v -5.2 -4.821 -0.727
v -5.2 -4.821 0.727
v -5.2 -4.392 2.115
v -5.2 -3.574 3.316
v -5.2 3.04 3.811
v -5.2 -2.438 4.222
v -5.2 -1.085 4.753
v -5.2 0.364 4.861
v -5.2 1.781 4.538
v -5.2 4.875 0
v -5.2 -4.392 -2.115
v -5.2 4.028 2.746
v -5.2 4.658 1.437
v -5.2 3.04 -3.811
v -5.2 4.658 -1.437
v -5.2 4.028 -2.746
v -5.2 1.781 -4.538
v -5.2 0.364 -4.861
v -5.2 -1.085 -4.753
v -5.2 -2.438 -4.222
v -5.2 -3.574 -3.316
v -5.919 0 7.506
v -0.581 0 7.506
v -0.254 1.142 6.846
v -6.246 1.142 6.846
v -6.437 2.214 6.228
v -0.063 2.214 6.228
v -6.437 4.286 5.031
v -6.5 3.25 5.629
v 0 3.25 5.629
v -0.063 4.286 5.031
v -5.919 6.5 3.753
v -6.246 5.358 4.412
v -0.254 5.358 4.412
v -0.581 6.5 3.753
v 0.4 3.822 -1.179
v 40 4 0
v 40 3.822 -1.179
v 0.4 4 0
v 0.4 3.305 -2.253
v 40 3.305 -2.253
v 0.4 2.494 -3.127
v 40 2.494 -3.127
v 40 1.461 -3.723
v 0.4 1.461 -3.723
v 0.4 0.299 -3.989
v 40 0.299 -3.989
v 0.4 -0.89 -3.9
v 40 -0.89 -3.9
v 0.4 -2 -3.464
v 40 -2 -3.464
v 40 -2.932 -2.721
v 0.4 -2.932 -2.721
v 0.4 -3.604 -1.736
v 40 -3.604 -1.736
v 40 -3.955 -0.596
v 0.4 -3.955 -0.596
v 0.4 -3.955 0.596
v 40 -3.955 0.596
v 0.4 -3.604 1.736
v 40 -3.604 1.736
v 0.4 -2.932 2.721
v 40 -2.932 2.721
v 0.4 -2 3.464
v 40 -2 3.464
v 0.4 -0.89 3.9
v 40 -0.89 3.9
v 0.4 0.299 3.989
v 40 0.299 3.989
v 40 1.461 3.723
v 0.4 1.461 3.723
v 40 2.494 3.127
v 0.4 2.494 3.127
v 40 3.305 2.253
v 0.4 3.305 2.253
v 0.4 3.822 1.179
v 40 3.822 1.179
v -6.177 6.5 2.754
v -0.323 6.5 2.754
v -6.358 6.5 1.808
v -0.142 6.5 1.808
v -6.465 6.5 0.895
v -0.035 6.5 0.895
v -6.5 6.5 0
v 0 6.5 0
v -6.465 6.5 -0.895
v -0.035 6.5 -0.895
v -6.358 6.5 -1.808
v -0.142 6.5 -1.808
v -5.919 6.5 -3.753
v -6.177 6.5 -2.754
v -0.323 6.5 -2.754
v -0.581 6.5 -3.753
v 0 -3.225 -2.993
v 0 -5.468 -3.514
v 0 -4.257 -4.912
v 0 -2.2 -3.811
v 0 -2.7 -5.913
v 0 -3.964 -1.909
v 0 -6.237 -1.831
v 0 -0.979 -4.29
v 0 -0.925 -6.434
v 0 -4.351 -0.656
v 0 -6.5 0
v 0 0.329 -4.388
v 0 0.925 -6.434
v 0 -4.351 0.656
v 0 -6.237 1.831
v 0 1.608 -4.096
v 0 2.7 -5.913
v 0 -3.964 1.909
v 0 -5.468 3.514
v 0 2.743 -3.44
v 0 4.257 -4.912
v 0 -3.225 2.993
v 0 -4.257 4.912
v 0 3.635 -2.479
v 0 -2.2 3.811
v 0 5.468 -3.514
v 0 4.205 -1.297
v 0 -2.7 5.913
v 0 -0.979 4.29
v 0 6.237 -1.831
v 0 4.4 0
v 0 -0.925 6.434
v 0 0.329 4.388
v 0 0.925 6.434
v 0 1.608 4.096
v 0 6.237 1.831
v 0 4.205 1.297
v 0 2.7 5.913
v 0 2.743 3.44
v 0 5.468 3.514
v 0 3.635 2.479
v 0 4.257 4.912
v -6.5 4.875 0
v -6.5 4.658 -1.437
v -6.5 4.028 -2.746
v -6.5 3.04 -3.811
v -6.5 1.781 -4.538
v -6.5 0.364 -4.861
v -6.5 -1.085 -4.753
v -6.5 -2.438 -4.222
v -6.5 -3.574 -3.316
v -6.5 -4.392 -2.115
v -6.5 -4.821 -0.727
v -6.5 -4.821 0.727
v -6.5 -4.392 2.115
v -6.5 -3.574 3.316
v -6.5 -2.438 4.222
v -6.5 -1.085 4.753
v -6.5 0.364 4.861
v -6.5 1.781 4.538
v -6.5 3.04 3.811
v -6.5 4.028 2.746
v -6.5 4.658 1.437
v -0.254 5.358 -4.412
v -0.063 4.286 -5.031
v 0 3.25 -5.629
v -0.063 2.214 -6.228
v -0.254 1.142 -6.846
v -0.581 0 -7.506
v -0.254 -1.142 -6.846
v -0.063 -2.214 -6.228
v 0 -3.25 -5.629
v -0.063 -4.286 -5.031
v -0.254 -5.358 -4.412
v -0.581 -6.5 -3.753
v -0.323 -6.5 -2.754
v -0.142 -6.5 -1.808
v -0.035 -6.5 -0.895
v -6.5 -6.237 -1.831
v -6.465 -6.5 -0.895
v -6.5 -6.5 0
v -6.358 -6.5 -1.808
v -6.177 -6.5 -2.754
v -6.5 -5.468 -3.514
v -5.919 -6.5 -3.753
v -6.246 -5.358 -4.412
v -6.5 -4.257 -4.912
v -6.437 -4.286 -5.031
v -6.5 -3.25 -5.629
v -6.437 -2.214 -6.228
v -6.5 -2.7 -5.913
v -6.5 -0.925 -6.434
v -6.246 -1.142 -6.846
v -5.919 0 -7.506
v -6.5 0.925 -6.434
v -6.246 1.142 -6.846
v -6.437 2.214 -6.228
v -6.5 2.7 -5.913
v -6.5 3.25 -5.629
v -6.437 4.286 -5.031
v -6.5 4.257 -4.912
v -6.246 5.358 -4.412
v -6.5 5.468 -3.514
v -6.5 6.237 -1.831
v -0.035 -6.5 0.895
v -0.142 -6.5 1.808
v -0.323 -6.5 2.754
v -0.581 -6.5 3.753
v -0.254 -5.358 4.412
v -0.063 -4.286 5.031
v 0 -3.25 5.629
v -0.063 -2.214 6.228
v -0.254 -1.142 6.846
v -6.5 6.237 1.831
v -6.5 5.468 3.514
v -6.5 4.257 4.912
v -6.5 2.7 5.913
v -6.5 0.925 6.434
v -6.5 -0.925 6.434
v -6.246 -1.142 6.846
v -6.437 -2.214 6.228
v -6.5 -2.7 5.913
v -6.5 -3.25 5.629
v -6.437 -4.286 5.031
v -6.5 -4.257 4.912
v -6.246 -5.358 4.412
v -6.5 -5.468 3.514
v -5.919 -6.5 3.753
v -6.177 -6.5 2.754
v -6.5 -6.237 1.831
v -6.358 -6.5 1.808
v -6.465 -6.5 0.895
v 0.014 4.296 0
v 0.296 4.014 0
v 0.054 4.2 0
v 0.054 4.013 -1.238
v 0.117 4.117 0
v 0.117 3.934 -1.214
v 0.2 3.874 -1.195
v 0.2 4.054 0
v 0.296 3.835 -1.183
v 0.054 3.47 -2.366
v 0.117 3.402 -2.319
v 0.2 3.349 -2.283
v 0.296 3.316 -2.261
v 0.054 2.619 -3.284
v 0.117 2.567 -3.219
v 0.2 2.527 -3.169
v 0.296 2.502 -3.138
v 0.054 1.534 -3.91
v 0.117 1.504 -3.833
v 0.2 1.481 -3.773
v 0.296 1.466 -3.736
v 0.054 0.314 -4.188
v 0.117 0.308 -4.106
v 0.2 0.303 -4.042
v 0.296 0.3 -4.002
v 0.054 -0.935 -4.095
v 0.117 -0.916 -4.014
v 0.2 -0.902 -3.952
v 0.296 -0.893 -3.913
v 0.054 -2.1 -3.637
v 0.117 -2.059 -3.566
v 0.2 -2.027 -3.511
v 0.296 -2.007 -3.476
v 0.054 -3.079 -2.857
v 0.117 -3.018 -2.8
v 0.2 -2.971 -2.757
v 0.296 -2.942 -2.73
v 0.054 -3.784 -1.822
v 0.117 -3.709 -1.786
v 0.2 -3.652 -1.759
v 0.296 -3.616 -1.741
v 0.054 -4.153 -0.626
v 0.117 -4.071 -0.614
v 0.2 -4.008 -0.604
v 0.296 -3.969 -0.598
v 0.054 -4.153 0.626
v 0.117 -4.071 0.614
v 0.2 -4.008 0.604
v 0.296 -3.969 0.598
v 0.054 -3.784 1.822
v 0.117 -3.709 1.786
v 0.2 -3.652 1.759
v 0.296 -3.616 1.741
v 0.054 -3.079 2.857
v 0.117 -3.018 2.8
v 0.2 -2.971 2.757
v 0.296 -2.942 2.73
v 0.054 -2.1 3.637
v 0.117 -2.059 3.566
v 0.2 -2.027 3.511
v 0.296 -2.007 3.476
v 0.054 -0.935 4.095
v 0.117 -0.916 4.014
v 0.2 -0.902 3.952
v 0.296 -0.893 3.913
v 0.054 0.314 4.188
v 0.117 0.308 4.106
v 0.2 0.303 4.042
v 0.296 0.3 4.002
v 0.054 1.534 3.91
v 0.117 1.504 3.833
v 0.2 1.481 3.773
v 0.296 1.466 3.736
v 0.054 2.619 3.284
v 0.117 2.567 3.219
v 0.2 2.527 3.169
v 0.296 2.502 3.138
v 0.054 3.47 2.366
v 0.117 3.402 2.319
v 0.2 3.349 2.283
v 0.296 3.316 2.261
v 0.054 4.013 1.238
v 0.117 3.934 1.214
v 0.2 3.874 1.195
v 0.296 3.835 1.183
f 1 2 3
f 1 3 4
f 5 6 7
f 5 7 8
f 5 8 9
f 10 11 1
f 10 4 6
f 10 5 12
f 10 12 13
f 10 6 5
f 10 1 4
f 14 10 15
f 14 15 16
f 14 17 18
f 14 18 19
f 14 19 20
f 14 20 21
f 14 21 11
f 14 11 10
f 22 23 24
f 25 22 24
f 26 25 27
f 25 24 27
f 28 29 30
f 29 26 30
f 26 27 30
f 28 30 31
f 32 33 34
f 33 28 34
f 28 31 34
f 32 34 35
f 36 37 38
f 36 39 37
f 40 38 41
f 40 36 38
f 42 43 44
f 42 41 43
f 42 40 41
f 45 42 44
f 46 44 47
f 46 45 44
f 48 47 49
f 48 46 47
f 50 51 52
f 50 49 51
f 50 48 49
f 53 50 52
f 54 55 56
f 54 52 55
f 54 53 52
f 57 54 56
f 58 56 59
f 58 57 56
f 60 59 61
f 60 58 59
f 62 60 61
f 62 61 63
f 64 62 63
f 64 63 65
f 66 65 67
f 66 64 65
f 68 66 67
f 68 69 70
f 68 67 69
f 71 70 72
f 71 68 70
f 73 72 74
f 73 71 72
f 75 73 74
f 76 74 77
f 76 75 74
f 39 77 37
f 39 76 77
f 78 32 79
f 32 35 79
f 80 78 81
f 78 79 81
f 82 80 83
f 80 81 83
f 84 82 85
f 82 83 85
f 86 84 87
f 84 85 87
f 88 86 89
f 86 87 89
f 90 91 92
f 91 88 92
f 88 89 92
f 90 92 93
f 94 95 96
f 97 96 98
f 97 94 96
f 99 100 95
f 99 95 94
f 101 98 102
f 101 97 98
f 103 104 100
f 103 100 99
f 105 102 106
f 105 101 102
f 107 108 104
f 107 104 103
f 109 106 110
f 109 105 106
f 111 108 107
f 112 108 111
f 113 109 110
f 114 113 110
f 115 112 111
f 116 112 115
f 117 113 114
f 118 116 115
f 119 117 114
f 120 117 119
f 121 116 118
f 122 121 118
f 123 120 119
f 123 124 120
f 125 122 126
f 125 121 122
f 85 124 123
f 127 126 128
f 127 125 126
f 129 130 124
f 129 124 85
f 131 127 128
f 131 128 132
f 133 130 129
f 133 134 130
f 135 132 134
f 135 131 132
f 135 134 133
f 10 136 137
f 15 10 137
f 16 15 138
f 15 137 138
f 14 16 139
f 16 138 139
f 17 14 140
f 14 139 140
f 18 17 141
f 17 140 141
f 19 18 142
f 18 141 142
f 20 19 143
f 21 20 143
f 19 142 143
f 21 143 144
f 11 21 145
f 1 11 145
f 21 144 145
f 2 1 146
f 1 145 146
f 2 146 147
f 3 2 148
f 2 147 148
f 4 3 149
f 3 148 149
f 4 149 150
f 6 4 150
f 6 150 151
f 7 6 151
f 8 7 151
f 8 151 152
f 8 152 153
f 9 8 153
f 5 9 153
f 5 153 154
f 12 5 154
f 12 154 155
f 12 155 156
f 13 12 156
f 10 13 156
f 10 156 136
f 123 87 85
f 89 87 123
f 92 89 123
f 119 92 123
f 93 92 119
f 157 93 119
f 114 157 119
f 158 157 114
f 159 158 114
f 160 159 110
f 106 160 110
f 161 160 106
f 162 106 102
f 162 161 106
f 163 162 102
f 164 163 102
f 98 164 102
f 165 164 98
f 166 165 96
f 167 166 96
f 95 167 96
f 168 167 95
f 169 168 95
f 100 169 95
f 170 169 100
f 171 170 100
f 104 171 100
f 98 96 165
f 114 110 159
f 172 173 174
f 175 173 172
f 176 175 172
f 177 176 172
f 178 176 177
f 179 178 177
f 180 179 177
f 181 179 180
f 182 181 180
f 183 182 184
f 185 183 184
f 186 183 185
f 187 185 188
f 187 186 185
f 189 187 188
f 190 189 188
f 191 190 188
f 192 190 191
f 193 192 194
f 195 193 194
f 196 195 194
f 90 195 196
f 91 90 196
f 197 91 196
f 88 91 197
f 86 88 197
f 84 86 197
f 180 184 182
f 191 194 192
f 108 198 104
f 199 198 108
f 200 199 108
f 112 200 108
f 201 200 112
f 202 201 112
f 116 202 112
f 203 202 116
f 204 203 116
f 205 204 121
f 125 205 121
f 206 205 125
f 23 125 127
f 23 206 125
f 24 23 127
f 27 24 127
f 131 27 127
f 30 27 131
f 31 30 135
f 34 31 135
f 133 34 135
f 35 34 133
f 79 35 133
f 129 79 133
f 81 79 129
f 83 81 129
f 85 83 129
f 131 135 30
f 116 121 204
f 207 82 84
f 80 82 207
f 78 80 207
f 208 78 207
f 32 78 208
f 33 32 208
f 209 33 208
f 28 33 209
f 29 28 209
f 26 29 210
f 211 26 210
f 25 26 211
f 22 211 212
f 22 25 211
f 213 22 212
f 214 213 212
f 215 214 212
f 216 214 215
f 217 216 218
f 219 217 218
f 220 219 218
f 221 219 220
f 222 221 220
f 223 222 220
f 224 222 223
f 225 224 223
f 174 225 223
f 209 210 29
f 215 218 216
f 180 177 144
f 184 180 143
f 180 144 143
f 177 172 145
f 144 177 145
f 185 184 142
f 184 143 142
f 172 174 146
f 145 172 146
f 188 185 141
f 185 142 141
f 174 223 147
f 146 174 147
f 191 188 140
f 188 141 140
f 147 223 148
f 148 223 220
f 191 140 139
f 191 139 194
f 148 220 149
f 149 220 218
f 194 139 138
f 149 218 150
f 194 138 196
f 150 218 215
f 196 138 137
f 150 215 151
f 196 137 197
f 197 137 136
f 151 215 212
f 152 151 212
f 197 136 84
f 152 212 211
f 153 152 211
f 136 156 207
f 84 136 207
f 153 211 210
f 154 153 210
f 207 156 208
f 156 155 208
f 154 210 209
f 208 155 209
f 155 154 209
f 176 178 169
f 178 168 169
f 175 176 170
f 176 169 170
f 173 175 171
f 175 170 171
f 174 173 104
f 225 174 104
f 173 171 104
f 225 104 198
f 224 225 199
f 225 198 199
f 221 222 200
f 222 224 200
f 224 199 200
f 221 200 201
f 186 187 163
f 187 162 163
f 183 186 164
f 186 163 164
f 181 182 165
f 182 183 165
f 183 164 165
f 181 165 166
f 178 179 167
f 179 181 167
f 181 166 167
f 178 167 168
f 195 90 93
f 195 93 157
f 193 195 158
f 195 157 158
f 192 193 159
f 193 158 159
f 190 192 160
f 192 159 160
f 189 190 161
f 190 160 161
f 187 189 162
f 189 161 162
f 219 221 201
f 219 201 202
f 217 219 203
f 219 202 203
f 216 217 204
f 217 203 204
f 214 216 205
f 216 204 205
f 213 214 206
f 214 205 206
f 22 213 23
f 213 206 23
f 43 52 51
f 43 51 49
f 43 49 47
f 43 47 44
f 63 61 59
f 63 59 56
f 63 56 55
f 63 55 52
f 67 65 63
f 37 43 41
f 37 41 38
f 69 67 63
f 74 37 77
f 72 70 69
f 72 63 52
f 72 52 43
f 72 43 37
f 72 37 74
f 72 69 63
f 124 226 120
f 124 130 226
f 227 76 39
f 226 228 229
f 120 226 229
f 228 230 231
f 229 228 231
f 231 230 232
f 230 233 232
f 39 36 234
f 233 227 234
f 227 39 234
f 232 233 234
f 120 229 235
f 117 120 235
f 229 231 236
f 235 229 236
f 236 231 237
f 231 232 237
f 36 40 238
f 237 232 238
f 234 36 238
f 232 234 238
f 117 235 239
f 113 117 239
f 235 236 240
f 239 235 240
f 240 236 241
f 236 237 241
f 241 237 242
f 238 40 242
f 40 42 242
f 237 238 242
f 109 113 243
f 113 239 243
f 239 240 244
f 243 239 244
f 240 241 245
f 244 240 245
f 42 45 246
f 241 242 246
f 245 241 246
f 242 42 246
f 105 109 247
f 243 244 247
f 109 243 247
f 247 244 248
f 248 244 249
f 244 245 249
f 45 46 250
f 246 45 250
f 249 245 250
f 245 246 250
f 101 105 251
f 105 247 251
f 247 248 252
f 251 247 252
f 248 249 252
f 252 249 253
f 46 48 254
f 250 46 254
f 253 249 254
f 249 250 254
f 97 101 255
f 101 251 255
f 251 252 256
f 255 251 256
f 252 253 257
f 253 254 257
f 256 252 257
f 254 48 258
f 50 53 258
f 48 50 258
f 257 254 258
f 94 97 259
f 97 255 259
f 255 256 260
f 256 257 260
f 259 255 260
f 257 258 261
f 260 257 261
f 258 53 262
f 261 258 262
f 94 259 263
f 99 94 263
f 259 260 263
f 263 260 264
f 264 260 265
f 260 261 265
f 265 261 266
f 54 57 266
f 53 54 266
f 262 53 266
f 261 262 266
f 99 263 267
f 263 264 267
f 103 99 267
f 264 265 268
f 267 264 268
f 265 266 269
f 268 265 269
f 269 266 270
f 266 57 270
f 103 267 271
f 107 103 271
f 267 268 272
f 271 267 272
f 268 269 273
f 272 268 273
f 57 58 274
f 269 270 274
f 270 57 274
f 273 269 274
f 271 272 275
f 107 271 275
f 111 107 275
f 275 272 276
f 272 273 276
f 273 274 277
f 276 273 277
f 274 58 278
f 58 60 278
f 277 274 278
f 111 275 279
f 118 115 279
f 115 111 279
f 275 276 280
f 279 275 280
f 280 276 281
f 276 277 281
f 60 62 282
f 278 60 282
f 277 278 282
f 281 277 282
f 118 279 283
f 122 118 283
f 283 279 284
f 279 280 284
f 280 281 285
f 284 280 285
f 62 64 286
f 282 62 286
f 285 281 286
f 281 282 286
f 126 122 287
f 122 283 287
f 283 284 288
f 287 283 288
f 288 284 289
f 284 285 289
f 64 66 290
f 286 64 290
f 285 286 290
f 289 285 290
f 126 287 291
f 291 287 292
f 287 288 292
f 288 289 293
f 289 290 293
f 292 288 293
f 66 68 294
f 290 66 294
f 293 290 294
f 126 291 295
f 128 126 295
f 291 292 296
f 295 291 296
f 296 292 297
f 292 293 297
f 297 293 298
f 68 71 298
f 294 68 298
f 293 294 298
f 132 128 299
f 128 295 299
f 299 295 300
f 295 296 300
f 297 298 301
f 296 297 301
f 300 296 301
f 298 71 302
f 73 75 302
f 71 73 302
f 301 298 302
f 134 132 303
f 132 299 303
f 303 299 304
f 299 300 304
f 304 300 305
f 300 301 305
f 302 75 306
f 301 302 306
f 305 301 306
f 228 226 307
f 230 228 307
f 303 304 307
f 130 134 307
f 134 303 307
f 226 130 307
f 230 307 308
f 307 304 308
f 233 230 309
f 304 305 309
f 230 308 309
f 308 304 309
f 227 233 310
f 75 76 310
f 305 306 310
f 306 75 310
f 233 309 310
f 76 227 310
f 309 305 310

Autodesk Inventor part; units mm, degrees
ref_plane "YZ Plane" through (0, 0, 0) normal (1, 0, 0) x (0, 1, 0)
ref_plane "XZ Plane" through (0, 0, 0) normal (0, 1, 0) x (-1, 0, 0)
sketch "Sketch1" plane through (0, 0, 0) normal (0, 0, 1) x (1, 0, 0)
  line L0 (0, 4) -> (0, 0)
  line L1 (0, 0) -> (40, 0)
  line L2 (40, 0) -> (40, 4)
  line L3 (40, 4) -> (0, 4)
  line L4 (-8, 0) -> (48, 0) projected
  line L5 (0, -0.8) -> (0, 4.8) projected
  dimension "d0" = 8
  dimension "d1" = 40
revolve "Body" add sketch "Sketch1" angle 360 about axis through (0, 0, 0) along (1, 0, 0)
sketch "Sketch2" plane through (0, 0, 0) normal (1, 0, 0) x (0, 1, 0)
  line L0 (0, 7.5056) -> (6.5, 3.7528)
  line L1 (6.5, 3.7528) -> (6.5, -3.7528)
  line L2 (6.5, -3.7528) -> (0, -7.5056)
  line L3 (0, -7.5056) -> (-6.5, -3.7528)
  line L4 (-6.5, -3.7528) -> (-6.5, 3.7528)
  line L5 (-6.5, 3.7528) -> (0, 7.5056)
  line L6 (-9.1, 0) -> (9.1, 0) projected
  line L7 (0, -10.5078) -> (0, 10.5078) projected
  point P0 (0, 0)
  point P1 (0, 0)
  dimension "d2" = 13
extrude "Head" add sketch "Sketch2" against normal blind 6.5
sketch "Sketch3" plane through (-6.5, 0, 0) normal (-1, 0, 0) x (0, 1, 0)
  circle A0 centre (0, 0) radius 4.875
  point P0 (0, 0)
  dimension "d12" = 9.75
extrude "Indent1" cut sketch "Sketch3" against normal blind 1.3
sketch "Sketch4" plane through (0, 0, 0) normal (0, 0, 1) x (1, 0, 0)
  line L0 (-6.5, 7.5056) -> (-6.5, 6.5)
  line L1 (-6.5, 6.5) -> (-5.9194, 7.5056)
  line L2 (-5.9194, 7.5056) -> (-6.5, 7.5056)
  line L3 (0, 7.5056) -> (0, 6.5)
  line L4 (0, 6.5) -> (-0.5806, 7.5056)
  line L5 (-0.5806, 7.5056) -> (0, 7.5056)
  line L6 (0, 0) -> (-6.5, 0) projected
  line L7 (-6.5, 0) -> (-6.5, 6.5) projected
  line L8 (0, 0) -> (0, 6.5) projected
  line L9 (-7.8, 0) -> (1.3, 0) projected
  line L10 (-5.9194, 7.5056) -> (-0.5806, 7.5056) construction
  line L11 (0, -1.5011) -> (0, 9.0067) projected
  dimension "d6" = 30
  dimension "d7" = 30
  dimension "d16" = 13
  dimension "d17" = 13
  dimension "d18" = 15.0111
revolve "Chamfer1" cut sketch "Sketch4" angle 360 about axis through (-10, 0, 0) along (1, 0, 0)
fillet "Fillet1" radius 0.4 1 edges at (0, -4, 0)
thread "Thread" size "M8x1.25" class "6g" standard "ISO Metric profile" length 37.5
ref_plane "Work Plane1" through (3, 0, 0) normal (0, 0.5, 0.866) x (1, 0, 0)
equation "\"d0\" = GD"
equation "\"d1\" = NLG"
equation "\"d2\" = SW"
equation "\"d3\" = KOH"
equation "\"d12\" = 0.75 * SW0"
equation "\"d14\" = 0.2 * KOH"
equation "\"d6\" = ANG1"
equation "\"d7\" = ANG1"
equation "\"d16\" = SW0"
equation "\"d17\" = SW0"
equation "\"d18\" = 1.1547 * SW"
equation "\"d11\" = RR"
equation "\"d8\" = GEL"
equation "\"NLG\" = 40"
equation "\"KOH\" = 6.5"
equation "\"GD\" = NND"
equation "\"GEL\" = 37.5"
equation "\"SW\" = 13"
equation "\"SW0\" = SW"
equation "\"ANG1\" = 30deg"
equation "\"RR\" = 0.4"
equation "\"GUL\" = 0.61345 * PTC"
equation "\"SPD\" = NND - 1.2269 * PTC"
equation "\"GD1\" = THREADDIA - 1.2269 * PTC"
equation "\"THREADDIA\" = 8"
equation "\"SDH\" = 9.2"
equation "\"TOA\" = 30deg"
equation "\"BDM\" = NND"
equation "\"FAWI\" = 45deg"
equation "\"PTC\" = 1.25"
equation "\"NND\" = 8"
equation "\"GAL\" = 0.61345 * PTC"
equation "\"SD\" = 0"
equation "\"SD2\" = SDH"
equation "\"E0\" = 1.155 * SW"
properties part number "AS 1427 - M8 x 40" material "Steel, Mild"
